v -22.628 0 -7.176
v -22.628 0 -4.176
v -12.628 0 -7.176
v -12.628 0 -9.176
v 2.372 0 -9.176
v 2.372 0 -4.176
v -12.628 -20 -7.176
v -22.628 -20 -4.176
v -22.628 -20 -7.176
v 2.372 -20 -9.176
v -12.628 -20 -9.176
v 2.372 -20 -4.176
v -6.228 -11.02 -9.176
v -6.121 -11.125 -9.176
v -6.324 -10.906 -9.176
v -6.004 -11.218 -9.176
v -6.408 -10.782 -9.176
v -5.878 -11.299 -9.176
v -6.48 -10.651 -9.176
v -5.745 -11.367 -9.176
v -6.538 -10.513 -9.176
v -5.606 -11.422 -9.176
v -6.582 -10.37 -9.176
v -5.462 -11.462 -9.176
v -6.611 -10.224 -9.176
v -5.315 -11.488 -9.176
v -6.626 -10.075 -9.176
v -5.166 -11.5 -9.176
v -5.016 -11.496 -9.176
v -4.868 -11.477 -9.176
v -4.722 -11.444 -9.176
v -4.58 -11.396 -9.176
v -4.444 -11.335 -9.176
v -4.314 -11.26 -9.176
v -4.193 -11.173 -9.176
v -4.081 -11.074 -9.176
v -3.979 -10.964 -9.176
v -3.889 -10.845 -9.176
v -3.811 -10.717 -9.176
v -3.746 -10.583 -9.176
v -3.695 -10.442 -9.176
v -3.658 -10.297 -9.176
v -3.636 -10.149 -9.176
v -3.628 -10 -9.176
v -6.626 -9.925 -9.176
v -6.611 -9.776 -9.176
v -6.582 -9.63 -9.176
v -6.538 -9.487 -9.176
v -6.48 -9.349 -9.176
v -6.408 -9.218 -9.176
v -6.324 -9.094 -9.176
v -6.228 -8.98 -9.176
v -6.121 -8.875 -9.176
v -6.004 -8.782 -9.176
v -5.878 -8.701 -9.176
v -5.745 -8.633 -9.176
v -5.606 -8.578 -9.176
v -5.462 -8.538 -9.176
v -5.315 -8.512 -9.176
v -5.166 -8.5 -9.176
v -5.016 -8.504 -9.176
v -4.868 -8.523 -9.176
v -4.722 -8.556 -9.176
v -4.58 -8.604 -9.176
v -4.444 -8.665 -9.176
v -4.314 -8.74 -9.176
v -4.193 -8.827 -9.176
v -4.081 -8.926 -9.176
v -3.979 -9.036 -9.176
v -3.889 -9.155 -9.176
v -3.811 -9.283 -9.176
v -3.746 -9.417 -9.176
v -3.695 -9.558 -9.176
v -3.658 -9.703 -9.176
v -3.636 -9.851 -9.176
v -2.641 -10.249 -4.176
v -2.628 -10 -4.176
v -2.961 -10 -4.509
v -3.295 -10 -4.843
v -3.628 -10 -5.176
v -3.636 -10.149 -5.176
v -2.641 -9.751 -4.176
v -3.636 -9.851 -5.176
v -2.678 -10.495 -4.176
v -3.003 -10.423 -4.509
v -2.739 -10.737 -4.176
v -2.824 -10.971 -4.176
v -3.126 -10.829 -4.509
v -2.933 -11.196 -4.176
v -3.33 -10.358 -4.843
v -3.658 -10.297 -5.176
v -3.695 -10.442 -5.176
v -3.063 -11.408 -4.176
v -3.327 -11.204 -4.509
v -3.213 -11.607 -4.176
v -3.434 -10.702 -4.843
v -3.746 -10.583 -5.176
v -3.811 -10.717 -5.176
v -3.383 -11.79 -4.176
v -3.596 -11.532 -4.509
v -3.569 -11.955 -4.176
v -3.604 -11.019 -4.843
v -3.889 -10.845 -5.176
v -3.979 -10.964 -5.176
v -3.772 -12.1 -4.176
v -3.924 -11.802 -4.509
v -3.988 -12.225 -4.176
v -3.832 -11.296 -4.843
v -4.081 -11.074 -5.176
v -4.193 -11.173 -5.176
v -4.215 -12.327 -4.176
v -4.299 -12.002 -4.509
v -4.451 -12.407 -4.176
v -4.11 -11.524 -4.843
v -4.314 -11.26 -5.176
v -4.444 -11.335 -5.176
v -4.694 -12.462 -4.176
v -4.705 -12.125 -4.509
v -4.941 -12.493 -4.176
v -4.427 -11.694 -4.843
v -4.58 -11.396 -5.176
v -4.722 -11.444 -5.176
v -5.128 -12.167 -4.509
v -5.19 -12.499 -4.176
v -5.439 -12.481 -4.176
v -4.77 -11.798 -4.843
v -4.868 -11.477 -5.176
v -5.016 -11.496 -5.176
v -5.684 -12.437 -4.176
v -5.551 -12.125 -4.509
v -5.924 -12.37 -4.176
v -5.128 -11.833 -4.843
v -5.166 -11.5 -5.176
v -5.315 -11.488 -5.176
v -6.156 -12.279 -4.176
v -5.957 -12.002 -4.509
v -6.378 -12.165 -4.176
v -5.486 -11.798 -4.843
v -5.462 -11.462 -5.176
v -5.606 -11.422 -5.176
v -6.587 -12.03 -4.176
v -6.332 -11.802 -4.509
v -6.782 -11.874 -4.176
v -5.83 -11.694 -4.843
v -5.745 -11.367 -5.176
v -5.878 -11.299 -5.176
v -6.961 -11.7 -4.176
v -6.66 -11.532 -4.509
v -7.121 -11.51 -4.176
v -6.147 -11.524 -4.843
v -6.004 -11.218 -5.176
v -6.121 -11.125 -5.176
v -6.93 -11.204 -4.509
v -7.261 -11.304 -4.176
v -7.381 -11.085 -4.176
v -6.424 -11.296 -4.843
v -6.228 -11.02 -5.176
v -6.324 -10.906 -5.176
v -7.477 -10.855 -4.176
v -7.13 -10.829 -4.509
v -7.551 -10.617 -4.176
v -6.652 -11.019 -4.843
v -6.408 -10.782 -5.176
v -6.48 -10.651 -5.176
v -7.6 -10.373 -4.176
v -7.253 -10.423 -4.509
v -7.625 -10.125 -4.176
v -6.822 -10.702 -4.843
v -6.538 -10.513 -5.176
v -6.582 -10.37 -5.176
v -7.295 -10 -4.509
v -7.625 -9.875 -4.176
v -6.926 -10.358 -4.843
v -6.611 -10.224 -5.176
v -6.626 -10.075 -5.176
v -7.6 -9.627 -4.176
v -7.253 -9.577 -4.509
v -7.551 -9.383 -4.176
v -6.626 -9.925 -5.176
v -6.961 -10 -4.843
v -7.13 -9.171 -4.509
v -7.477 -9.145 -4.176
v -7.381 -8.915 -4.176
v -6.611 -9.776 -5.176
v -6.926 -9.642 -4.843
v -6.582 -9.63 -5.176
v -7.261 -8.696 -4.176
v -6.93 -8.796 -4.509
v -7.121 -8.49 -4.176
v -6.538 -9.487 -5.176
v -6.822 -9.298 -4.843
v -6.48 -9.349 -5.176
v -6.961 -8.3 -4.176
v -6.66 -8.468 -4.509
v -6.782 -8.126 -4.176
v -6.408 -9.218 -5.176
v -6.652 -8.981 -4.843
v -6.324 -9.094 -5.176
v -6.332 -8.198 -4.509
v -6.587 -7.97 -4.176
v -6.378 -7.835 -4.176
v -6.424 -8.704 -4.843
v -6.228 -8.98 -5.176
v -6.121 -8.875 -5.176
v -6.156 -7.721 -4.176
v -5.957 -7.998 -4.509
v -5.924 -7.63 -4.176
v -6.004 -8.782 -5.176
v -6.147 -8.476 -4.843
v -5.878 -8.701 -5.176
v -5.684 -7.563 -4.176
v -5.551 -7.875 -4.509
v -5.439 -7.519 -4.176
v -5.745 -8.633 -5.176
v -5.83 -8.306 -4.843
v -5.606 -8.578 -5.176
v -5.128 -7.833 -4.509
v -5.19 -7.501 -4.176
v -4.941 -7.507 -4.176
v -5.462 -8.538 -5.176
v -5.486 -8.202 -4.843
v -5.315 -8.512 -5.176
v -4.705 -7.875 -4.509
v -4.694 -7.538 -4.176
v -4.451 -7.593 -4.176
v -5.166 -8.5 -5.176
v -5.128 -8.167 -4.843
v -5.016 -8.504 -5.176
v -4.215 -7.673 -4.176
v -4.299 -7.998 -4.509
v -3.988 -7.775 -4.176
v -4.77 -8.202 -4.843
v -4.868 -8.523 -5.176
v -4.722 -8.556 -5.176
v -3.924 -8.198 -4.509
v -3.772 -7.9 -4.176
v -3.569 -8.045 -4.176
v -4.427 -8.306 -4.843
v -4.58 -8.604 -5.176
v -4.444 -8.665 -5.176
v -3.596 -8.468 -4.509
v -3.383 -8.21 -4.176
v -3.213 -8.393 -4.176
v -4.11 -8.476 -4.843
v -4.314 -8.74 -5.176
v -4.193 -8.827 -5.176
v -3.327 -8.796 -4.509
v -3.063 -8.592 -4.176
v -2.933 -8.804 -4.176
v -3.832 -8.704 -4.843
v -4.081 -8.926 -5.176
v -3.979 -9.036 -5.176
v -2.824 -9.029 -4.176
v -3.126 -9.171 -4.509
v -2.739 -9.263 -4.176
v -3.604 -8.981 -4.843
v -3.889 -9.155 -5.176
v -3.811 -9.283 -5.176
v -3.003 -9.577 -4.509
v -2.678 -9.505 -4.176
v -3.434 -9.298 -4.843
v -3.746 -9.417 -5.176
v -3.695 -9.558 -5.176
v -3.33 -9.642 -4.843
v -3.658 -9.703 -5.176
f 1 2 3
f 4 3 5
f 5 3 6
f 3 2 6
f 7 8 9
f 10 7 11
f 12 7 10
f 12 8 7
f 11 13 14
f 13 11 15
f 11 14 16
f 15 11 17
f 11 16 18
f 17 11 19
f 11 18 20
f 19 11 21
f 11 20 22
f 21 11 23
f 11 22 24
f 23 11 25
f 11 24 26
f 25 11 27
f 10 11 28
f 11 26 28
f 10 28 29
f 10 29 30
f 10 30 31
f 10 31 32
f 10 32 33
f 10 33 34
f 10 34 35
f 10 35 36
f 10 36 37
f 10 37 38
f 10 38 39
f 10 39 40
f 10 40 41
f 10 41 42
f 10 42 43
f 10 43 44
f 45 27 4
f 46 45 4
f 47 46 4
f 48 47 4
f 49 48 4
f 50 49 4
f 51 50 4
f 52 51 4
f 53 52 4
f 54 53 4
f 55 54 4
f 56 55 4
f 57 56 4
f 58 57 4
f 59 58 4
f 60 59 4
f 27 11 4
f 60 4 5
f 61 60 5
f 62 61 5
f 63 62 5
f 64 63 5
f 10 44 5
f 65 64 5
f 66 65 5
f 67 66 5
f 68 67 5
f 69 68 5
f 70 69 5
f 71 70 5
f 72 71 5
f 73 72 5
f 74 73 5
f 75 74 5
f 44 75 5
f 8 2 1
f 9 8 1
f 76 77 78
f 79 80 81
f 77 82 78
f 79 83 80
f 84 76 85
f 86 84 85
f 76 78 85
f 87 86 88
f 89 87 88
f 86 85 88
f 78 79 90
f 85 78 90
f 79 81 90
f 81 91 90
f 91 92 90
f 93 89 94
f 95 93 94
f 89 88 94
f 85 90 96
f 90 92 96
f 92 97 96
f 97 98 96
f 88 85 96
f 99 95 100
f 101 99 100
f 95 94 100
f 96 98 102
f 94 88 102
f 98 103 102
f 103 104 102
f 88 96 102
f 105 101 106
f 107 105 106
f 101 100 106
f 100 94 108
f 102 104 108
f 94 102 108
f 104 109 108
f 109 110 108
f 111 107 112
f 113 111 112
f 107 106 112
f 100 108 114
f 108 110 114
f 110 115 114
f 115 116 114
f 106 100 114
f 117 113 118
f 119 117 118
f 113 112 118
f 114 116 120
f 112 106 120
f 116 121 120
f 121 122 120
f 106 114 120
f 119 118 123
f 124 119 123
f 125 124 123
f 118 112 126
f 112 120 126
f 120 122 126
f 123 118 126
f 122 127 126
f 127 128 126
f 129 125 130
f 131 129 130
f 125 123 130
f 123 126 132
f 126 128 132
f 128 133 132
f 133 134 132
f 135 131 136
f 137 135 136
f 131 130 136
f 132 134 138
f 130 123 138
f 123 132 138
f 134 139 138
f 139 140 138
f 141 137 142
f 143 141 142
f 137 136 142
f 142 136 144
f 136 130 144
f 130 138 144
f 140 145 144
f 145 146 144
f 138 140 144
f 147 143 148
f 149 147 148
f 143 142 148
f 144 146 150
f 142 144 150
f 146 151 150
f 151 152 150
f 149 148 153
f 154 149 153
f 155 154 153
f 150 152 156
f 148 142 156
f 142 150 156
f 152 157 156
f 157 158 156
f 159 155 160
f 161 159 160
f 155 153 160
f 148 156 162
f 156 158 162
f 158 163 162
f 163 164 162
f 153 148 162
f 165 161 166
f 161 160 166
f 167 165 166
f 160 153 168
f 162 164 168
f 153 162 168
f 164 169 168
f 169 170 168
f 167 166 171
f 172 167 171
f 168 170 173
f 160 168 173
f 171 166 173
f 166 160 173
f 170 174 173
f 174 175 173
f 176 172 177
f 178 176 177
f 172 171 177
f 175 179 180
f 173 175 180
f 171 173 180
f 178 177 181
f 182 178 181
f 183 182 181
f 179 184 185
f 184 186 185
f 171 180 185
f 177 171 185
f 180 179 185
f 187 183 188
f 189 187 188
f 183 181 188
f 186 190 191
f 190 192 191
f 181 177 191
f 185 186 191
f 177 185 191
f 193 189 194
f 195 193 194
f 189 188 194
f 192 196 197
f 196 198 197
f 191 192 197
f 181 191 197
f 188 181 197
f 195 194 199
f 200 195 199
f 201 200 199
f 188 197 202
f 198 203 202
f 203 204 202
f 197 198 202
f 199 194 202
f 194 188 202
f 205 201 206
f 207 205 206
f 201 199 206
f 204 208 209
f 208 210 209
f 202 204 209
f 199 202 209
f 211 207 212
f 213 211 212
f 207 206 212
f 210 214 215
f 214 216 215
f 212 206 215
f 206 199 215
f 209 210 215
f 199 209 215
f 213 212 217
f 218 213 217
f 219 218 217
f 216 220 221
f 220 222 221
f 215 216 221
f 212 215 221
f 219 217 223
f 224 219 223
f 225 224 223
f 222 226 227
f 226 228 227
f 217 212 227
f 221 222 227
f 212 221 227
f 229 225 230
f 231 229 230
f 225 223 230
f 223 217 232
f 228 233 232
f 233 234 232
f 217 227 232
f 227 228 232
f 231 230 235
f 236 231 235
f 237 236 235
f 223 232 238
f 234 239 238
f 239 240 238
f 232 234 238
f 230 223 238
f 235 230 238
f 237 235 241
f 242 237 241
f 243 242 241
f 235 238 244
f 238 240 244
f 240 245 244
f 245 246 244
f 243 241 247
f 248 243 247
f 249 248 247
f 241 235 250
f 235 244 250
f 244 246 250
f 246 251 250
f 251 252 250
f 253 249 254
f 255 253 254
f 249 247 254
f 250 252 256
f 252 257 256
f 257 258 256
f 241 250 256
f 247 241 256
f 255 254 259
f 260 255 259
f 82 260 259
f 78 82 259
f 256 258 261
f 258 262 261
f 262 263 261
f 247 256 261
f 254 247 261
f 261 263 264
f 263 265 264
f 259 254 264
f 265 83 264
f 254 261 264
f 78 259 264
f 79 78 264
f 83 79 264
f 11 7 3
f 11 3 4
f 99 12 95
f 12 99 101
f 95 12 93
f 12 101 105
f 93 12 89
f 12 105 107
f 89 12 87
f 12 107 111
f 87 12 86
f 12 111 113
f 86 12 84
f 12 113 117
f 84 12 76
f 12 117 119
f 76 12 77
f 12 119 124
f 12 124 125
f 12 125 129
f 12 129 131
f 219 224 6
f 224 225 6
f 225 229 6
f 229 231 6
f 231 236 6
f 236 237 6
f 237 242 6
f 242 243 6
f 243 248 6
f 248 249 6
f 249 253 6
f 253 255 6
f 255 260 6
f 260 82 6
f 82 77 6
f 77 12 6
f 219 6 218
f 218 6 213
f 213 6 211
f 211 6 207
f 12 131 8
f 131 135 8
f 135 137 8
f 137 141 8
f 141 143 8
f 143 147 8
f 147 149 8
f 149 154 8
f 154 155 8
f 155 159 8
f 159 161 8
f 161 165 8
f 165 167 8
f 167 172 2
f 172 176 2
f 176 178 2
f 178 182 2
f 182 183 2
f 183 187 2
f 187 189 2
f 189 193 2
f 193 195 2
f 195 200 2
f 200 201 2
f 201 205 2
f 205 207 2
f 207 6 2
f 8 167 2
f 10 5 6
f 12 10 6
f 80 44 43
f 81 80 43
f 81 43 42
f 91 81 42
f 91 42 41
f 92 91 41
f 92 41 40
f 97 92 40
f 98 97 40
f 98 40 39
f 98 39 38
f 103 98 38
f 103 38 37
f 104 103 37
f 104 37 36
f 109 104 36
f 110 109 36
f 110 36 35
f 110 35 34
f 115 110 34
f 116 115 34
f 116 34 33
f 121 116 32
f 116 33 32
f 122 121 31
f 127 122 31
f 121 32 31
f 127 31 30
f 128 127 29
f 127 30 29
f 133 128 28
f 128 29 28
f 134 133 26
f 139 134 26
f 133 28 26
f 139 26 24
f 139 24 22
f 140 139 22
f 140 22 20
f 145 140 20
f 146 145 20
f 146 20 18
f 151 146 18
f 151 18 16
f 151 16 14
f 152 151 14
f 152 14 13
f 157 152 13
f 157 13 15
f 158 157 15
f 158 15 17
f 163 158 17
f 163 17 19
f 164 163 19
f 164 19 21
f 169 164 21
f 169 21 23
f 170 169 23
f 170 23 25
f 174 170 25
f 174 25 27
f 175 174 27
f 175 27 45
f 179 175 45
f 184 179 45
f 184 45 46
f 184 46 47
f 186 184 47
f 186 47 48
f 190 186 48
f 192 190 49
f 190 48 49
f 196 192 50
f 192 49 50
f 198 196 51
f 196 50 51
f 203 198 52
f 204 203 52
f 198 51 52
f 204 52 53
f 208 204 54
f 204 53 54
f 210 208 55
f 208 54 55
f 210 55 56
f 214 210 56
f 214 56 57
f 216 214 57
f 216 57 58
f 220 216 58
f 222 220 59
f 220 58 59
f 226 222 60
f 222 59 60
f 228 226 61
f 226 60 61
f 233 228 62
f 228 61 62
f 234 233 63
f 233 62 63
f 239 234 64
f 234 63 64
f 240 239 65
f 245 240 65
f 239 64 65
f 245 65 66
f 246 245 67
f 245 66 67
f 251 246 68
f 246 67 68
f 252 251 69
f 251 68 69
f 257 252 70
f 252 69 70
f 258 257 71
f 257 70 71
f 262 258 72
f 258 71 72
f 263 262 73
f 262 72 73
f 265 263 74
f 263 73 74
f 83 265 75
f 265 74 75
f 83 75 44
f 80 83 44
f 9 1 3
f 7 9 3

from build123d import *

# Parameters (mm, degrees)
F1_DEPTH = 20
F2_R     = 1.5
F3_DEPTH = 5.001
F4_SIZE  = 1


with BuildPart() as f1:
    # F0 (on Front) → F1 (new body)
    with BuildSketch(Plane.XZ):
        Polygon((-22.628114, -7.176122), (-12.628114, -7.176122), (-12.628114, -9.176122), (2.371886, -9.176122), (2.371886, -4.176122), (-22.628114, -4.176122), align=None)
    extrude(amount=F1_DEPTH)

    # F2 (on face) → F3 (cut, through all)
    with BuildSketch(Plane(origin=(0, 0, -9.176122), x_dir=(1, 0, 0), z_dir=(0, 0, -1))):
        with Locations((-5.128114, 10)):
            Circle(F2_R)
    extrude(amount=-F3_DEPTH, mode=Mode.SUBTRACT)

    # F4
    f4_edges = [f1.edges().sort_by_distance(p)[0] for p in [
        (-6.628114, -10, -4.176122),
    ]]
    chamfer(f4_edges, length=F4_SIZE)


solid = f1.part
